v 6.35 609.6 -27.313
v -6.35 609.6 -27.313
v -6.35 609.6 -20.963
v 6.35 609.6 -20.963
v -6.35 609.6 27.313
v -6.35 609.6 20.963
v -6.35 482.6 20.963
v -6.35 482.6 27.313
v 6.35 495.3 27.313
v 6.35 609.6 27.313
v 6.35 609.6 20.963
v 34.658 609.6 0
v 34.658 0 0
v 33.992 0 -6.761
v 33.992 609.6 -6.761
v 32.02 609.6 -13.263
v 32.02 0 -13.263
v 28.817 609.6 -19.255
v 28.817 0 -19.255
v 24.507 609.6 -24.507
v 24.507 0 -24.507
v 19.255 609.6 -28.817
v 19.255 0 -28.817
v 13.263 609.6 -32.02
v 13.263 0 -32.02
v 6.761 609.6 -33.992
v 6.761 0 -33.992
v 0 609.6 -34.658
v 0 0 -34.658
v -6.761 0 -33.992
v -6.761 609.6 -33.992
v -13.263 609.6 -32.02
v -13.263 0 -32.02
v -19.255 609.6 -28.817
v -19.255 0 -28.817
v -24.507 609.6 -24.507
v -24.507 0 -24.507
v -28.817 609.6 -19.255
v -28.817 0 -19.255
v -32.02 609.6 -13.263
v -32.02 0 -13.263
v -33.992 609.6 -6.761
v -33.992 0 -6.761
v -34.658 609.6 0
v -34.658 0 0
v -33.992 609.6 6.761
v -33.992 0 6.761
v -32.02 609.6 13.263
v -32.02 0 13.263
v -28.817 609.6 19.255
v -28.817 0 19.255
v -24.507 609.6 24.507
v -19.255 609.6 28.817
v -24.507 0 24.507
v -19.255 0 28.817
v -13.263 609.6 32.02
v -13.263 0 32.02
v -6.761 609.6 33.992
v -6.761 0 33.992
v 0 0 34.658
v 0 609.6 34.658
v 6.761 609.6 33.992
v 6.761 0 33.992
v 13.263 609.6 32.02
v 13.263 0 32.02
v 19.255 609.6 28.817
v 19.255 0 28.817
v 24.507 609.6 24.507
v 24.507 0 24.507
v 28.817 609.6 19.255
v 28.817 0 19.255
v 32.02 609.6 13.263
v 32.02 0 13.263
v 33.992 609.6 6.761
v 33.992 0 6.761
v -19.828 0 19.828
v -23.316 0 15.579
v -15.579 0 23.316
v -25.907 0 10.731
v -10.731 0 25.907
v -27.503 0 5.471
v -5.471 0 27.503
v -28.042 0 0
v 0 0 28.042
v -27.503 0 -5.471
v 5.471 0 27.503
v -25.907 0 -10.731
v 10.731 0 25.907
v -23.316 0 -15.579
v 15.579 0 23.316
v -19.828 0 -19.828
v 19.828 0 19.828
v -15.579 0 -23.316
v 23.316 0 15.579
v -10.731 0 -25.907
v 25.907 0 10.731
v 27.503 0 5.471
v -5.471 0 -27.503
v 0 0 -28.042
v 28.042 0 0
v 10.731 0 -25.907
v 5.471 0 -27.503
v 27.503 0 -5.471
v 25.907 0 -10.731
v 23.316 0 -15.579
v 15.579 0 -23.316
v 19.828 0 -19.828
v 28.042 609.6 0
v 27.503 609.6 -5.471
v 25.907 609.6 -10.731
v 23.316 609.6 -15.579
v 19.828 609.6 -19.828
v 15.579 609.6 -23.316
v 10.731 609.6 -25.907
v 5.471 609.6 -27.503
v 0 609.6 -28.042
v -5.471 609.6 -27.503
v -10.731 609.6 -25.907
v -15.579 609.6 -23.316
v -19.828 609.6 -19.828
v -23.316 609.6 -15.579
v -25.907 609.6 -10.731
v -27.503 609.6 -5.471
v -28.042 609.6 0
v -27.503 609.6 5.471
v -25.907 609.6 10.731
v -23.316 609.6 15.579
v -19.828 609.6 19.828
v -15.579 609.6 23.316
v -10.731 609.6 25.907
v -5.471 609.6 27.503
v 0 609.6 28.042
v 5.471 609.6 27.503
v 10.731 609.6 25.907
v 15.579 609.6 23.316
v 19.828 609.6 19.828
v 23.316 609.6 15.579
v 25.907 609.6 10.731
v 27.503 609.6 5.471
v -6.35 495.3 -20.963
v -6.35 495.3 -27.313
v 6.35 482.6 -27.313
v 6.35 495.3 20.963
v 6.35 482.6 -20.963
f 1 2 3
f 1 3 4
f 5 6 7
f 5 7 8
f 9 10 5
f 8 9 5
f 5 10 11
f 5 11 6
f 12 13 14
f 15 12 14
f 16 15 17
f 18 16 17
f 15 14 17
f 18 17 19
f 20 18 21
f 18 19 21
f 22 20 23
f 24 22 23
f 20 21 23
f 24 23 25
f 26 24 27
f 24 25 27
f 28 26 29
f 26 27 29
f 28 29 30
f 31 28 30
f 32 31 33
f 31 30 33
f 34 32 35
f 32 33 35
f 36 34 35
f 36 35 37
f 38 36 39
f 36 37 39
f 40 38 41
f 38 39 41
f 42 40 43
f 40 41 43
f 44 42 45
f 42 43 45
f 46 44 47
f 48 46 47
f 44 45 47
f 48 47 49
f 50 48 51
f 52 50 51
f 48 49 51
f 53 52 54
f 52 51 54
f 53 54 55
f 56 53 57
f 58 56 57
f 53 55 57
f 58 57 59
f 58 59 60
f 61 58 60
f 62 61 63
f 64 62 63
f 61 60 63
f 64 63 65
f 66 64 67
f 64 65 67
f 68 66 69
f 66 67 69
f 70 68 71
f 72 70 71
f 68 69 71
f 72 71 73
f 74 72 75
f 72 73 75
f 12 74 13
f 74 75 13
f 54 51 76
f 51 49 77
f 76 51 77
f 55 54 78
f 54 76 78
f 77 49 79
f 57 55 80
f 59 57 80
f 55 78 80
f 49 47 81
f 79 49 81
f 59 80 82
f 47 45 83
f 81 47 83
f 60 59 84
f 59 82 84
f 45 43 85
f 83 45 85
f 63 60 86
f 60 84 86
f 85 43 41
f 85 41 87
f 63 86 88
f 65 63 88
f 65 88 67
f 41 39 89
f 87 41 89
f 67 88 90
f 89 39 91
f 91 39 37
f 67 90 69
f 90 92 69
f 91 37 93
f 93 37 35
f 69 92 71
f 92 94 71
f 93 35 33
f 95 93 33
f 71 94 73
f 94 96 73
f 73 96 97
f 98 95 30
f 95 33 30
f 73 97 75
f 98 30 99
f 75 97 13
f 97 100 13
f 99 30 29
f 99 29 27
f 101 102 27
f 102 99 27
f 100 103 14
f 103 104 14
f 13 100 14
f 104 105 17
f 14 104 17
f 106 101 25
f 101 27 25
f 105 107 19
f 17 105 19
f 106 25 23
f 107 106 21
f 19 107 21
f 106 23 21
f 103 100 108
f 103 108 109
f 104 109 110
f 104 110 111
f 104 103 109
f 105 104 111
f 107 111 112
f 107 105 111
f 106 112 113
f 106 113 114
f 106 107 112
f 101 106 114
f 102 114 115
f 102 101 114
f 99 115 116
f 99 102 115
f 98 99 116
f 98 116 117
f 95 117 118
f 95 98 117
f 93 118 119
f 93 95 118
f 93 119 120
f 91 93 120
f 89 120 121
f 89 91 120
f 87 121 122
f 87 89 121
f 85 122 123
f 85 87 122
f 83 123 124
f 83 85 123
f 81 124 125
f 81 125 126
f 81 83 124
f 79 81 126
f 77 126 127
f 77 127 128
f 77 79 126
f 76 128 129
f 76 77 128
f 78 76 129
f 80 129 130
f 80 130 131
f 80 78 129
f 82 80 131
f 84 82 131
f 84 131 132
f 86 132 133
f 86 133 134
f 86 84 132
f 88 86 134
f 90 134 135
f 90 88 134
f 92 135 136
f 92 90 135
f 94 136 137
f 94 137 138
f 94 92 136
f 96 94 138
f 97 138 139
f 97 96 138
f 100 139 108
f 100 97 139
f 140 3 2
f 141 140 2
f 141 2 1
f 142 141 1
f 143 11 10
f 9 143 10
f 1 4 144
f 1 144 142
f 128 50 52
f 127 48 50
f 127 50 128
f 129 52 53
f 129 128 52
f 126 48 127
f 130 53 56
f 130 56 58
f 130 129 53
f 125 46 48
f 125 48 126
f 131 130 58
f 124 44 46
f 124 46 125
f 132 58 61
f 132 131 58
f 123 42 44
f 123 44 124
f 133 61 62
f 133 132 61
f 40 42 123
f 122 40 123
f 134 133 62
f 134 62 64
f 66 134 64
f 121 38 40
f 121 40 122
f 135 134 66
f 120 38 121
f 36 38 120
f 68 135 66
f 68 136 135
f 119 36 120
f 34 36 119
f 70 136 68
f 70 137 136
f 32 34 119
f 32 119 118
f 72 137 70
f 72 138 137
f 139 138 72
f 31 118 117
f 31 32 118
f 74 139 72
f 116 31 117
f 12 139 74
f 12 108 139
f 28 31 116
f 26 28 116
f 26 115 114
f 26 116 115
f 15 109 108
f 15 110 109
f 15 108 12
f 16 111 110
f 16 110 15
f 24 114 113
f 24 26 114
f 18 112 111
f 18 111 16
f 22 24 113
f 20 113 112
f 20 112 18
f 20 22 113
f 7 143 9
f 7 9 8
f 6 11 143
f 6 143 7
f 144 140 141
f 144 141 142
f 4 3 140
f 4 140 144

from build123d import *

# Parameters (mm, degrees)
SKETCH1_R           = 34.6583
SKETCH1_R_2         = 28.0416
BOSS_EXTRUDE1_DEPTH = 609.6
SKETCH3_W           = 12.7
SKETCH3_H           = 6.35
BOSS_EXTRUDE3_DEPTH = 127
CUT_EXTRUDE2_DEPTH  = 6.35
CIRPATTERN8_COUNT   = 2


with BuildPart() as part:
    # Sketch1 → Boss-Extrude1 (new body)
    with BuildSketch(Plane(origin=(0, 0, 0), x_dir=(1, 0, 0), z_dir=(0, 1, 0))):
        Circle(SKETCH1_R)
        Circle(SKETCH1_R_2, mode=Mode.SUBTRACT)
    extrude(amount=BOSS_EXTRUDE1_DEPTH)


with BuildPart() as body_2:
    # Sketch3 → Boss-Extrude3 (new body)
    with BuildSketch(Plane(origin=(0, 609.6, 0), x_dir=(1, 0, 0), z_dir=(0, 1, 0))):
        with Locations((0, 24.138162222)):
            Rectangle(SKETCH3_W, SKETCH3_H)
    extrude(amount=-BOSS_EXTRUDE3_DEPTH)

    # Sketch4 → Cut-Extrude2 (cut)
    with BuildSketch(Plane.XY.offset(-20.963162222)):
        Polygon((6.35, 482.6), (-6.35, 482.6), (-6.35, 495.3), align=None)
    extrude(amount=-CUT_EXTRUDE2_DEPTH, mode=Mode.SUBTRACT)


with BuildPart() as cirpattern8_1:
    # CirPattern8: pattern copy
    add(body_2.part.rotate(Axis((0, 0, 0), (0, 1, 0)), 1 * 360 / CIRPATTERN8_COUNT))


solid = Compound([part.part, body_2.part, cirpattern8_1.part])
